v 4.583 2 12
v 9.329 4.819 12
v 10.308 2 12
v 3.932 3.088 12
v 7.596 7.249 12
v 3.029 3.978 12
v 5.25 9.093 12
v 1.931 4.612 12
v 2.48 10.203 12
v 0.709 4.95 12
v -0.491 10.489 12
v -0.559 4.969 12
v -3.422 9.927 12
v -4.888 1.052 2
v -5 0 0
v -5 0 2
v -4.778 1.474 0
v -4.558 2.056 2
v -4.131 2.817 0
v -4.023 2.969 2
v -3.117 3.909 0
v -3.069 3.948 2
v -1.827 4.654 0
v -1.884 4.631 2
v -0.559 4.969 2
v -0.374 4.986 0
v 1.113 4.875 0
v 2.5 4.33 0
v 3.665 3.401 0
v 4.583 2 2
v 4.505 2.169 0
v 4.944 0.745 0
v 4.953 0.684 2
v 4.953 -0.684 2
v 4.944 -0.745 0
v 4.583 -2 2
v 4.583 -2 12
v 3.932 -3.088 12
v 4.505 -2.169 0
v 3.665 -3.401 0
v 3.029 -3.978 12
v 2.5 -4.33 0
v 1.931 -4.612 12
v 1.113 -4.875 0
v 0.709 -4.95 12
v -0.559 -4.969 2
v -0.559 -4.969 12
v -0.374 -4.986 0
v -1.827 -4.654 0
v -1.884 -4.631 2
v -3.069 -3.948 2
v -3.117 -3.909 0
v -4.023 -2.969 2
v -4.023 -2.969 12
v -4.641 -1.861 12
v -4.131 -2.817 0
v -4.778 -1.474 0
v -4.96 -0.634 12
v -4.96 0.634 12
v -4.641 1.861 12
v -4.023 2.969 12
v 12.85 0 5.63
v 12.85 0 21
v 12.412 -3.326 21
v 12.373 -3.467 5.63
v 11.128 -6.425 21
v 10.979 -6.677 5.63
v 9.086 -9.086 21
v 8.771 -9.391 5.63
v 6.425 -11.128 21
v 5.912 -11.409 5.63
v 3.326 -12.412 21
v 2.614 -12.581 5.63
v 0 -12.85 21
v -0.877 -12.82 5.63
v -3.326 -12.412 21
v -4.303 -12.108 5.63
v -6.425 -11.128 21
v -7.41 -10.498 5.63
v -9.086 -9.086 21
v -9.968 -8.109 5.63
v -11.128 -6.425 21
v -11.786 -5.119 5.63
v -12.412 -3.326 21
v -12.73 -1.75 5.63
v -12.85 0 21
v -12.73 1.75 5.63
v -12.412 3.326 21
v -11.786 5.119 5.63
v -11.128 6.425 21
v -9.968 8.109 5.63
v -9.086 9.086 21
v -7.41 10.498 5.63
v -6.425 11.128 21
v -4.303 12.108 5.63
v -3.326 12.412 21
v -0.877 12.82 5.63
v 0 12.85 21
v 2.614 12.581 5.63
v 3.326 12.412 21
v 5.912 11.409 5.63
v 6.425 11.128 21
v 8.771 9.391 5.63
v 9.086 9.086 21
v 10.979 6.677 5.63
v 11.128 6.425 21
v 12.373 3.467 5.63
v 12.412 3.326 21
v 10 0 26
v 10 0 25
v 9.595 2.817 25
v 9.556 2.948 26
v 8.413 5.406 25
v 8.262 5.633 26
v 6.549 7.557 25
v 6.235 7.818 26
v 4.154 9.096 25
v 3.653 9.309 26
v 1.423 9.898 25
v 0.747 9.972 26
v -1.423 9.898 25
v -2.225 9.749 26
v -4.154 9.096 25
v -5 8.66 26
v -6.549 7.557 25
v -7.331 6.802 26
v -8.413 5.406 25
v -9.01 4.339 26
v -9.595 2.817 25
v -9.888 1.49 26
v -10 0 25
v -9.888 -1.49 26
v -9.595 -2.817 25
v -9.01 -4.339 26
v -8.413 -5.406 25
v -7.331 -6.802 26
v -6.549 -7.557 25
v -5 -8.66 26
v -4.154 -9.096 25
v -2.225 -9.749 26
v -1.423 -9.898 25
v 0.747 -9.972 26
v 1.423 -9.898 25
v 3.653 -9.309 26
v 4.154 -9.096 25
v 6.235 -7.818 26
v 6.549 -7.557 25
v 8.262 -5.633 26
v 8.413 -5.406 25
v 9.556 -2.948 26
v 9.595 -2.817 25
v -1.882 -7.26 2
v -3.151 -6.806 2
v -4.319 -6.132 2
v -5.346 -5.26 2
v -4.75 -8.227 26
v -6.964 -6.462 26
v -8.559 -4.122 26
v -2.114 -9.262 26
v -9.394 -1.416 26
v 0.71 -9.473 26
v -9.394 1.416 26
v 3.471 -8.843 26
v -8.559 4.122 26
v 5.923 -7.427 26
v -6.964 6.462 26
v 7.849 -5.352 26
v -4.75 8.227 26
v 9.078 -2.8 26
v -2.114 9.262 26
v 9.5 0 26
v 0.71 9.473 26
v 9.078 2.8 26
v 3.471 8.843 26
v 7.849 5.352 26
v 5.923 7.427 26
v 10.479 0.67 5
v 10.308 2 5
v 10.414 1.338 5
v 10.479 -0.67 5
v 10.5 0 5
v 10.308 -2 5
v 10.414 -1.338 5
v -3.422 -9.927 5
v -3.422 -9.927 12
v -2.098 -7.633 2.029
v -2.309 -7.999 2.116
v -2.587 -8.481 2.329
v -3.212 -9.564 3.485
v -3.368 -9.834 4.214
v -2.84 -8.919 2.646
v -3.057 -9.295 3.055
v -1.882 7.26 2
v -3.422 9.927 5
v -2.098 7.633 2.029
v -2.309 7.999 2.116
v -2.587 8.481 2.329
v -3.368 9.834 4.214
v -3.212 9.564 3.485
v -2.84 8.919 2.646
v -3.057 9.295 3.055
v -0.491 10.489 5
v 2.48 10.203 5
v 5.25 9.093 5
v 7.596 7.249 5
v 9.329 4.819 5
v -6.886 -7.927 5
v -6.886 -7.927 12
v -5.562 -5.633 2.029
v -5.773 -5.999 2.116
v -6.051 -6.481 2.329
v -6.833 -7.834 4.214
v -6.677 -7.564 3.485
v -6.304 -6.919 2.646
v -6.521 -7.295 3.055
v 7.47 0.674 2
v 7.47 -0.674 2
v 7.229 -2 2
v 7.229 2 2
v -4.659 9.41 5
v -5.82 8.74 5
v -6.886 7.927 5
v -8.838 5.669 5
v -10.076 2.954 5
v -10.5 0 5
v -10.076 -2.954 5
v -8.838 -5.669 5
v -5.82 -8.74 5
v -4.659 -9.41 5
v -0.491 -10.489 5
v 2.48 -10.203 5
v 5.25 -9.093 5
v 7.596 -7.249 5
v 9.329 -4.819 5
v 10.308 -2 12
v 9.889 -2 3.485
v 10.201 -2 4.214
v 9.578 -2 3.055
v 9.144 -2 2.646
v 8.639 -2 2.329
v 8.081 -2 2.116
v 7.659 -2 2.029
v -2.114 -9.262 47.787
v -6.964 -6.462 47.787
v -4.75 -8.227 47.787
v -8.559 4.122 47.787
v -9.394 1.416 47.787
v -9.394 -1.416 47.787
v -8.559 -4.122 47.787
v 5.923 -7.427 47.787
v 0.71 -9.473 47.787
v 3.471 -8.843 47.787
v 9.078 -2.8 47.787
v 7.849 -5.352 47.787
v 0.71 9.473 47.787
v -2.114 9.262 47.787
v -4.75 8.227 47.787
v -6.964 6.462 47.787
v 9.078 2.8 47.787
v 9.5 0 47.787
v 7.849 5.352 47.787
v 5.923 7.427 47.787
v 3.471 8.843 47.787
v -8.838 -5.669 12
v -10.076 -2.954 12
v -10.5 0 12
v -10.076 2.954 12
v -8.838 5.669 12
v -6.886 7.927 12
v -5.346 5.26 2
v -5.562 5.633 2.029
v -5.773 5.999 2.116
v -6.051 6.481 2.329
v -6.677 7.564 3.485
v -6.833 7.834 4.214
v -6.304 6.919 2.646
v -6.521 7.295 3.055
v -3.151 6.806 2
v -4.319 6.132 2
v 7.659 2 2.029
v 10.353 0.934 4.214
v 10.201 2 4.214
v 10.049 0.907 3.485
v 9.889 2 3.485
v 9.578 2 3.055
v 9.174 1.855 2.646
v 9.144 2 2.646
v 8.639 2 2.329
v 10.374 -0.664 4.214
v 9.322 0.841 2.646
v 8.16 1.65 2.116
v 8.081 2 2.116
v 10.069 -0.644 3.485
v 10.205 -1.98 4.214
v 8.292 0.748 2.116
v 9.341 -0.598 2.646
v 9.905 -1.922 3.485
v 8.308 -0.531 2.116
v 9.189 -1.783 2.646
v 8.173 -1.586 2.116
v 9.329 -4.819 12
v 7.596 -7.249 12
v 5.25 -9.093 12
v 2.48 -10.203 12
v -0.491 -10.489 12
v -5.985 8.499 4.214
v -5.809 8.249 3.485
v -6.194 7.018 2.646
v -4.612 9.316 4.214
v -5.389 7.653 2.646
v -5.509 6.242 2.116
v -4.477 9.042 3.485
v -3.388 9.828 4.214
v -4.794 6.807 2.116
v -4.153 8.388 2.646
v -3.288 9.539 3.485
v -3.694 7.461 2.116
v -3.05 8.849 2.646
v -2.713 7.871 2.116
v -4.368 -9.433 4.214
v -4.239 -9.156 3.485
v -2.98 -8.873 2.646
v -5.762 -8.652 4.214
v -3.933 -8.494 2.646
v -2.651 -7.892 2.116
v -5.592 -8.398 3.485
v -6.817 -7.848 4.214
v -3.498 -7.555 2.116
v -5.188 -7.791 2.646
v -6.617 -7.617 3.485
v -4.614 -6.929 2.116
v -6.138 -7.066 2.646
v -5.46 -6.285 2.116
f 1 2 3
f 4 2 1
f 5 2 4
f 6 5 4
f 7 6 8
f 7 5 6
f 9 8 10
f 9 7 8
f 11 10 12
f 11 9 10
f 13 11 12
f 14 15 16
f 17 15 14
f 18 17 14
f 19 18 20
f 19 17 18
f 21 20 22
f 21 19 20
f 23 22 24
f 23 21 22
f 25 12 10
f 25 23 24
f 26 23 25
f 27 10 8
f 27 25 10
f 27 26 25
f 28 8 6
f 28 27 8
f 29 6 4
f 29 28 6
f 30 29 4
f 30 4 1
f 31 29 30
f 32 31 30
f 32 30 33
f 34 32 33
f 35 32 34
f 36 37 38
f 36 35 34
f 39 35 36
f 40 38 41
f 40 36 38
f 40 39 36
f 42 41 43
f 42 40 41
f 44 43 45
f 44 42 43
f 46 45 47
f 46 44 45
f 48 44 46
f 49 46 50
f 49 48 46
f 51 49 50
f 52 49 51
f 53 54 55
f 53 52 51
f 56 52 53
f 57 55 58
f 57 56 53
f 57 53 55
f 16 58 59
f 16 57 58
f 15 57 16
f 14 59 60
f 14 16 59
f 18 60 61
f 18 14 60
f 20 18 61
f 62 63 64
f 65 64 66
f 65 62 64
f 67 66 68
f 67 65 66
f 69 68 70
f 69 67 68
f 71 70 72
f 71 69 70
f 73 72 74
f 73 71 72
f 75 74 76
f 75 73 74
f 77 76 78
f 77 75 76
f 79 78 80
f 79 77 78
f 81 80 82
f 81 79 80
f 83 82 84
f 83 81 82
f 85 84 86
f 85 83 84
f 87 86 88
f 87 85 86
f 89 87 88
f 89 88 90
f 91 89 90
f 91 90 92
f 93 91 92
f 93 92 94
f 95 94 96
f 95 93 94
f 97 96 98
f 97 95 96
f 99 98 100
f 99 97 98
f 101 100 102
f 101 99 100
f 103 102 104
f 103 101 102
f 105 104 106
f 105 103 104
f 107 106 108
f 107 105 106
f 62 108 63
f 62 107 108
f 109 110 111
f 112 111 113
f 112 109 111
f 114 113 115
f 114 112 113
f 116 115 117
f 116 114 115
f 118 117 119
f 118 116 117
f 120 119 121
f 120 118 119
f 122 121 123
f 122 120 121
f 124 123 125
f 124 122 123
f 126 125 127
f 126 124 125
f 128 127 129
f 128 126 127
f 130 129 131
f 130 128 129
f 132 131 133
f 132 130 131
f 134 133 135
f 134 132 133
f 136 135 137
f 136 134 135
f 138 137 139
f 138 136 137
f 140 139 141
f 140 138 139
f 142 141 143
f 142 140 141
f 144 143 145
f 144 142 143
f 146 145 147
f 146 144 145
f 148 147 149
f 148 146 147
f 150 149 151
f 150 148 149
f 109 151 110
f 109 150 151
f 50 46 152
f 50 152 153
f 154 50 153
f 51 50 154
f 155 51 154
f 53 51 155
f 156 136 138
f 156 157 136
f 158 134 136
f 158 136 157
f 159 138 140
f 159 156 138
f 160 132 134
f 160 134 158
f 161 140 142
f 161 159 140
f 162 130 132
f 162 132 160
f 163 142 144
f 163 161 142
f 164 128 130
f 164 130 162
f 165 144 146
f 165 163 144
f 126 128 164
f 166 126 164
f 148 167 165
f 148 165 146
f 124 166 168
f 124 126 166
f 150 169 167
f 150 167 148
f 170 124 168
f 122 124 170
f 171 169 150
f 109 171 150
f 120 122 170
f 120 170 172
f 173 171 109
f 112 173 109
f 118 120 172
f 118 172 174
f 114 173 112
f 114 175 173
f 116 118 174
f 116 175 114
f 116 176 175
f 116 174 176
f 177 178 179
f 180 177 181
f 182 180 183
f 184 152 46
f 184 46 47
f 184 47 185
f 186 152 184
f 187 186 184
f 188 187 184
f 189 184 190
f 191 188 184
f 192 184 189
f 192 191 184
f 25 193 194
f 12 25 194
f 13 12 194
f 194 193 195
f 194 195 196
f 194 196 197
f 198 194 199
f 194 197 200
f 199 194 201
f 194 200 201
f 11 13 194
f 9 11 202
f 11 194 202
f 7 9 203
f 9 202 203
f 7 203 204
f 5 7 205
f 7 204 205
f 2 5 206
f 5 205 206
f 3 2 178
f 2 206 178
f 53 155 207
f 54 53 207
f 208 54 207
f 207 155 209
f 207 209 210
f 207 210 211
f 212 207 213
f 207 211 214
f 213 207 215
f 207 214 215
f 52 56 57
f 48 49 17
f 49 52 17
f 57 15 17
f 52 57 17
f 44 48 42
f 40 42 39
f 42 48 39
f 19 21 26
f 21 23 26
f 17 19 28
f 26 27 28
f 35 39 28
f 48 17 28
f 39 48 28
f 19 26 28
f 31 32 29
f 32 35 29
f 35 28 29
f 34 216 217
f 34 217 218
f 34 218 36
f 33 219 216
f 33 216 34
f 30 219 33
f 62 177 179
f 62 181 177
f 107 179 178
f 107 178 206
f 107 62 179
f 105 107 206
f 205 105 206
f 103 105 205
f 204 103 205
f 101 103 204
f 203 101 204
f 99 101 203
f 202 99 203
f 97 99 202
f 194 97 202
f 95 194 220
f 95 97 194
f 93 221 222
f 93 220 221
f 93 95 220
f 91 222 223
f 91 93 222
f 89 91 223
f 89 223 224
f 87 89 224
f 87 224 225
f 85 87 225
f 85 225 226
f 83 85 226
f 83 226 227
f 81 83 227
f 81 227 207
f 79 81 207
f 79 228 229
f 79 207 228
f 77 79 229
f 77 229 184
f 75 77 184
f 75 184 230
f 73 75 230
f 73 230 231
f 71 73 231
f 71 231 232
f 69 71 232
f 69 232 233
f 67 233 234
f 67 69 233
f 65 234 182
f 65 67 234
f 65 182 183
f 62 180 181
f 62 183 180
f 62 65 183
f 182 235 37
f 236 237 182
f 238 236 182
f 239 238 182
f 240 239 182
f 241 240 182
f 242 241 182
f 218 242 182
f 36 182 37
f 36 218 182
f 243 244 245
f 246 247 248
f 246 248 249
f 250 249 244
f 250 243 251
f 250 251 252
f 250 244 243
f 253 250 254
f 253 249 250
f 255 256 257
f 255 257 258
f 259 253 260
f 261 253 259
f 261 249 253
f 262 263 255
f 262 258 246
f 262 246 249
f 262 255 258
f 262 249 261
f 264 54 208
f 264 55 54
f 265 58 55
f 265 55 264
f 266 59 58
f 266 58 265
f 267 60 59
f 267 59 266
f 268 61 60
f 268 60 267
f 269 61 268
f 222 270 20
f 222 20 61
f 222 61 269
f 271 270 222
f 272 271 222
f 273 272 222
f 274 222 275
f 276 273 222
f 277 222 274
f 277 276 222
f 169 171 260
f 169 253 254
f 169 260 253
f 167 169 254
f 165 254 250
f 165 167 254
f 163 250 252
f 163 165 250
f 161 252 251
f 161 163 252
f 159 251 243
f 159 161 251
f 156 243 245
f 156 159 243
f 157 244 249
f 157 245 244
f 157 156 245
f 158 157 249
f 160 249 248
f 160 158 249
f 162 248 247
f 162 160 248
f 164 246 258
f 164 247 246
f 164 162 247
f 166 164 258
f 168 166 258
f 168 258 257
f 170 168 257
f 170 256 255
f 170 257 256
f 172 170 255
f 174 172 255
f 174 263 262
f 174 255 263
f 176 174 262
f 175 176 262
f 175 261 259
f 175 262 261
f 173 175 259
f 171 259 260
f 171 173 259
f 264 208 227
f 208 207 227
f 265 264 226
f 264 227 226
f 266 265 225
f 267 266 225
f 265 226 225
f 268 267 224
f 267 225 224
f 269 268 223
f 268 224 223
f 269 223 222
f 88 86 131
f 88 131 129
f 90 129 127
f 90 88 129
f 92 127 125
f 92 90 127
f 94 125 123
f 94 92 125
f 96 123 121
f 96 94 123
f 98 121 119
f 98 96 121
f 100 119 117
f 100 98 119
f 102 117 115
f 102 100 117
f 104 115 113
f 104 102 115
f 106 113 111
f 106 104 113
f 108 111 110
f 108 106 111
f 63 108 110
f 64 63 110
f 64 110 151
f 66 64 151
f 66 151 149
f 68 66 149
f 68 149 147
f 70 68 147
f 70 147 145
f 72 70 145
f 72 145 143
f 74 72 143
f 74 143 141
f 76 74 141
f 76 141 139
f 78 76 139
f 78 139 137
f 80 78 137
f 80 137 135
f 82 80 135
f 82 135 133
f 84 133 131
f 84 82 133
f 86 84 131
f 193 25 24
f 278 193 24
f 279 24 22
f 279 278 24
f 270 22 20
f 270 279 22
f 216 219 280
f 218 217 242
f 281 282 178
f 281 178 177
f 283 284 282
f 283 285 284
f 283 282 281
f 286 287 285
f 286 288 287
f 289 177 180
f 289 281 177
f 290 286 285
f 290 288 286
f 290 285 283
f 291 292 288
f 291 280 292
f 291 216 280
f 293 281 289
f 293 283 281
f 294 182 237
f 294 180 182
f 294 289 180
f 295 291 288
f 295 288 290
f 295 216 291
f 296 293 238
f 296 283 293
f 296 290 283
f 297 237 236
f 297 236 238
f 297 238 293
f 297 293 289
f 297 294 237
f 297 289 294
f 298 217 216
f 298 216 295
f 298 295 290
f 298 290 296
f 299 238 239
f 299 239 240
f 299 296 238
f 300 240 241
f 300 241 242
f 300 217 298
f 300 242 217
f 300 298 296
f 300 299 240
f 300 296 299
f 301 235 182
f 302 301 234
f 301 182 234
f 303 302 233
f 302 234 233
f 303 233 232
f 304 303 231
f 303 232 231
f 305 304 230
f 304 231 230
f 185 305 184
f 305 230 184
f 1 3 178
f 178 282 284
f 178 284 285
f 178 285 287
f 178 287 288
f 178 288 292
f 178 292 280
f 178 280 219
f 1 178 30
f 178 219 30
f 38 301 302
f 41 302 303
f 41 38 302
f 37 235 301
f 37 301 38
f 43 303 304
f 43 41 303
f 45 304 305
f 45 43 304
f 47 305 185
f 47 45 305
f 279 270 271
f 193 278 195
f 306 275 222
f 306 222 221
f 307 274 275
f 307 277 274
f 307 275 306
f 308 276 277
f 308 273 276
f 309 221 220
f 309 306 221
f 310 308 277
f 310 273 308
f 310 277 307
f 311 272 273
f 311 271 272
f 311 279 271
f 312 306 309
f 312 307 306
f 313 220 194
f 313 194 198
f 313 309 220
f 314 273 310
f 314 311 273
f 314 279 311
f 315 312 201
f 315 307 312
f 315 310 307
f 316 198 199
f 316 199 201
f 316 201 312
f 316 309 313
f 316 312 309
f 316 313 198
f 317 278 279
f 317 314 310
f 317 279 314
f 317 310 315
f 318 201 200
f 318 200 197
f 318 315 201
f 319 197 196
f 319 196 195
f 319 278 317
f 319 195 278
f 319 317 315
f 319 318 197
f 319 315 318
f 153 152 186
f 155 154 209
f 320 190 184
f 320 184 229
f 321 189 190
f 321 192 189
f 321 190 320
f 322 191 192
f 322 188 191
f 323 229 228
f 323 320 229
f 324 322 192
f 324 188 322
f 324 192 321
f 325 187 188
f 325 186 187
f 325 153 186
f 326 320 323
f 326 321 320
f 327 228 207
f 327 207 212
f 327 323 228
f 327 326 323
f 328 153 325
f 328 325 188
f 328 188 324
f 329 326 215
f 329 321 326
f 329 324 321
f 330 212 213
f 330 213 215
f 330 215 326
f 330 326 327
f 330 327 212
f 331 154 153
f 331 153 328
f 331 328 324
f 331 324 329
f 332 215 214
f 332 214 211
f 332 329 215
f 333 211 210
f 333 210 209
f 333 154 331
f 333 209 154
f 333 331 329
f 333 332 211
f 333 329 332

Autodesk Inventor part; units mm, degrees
ref_plane "YZ Plane" through (0, 0, 0) normal (1, 0, 0) x (0, 1, 0)
ref_plane "XZ Plane" through (0, 0, 0) normal (0, 1, 0) x (-1, 0, 0)
ref_plane "XY Plane" through (0, 0, 0) normal (0, 0, 1) x (1, 0, 0)
sketch "草圖1" plane through (0, 0, 0) normal (0, 0, 1) x (1, 0, 0)
  circle A0 centre (0, 0) radius 12.85
  dimension "d0" = 25.7
extrude "擠出1" add sketch "草圖1" along normal blind 26
sketch "草圖2" plane through (0, 0, 26) normal (0, 0, 1) x (1, 0, 0)
  circle A0 centre (0, 0) radius 10
  circle A1 centre (0, 0) radius 12.85 projected
  dimension "d3" = 20
extrude "擠出2" cut sketch "草圖2" against normal blind 1
sketch "草圖3" plane through (0, 0, 0) normal (0, 1, 0) x (-1, 0, 0)
  line L0 (-12.85, 25) -> (12.85, 25) projected
  line L1 (10, 26) -> (10, 25) projected
  line L2 (10, 25) -> (12.85, 21)
  line L3 (12.85, 0) -> (12.85, 25) projected
  line L4 (0, -5.2) -> (0, 31.2) projected
  point P0 (0, 0)
  dimension "d6" = 4
revolve "迴轉1" cut sketch "草圖3" angle 360 about axis through (0, 0, -10) along (0, 0, 1)
sketch "草圖4" plane through (0, 0, 0) normal (0, 0, -1) x (-1, 0, 0)
  circle A0 centre (0, 0) radius 5
  circle A1 centre (0, 0) radius 12.85 projected
  dimension "d8" = 10
extrude "擠出3" cut sketch "草圖4" against normal blind 2
sketch "草圖5" plane through (0, 0, 2) normal (0, 0, -1) x (-1, 0, 0)
  circle A0 centre (0, 0) radius 10.5
  circle A1 centre (0, 0) radius 12.85 projected
  dimension "d11" = 21
extrude "擠出4" cut sketch "草圖5" against normal blind 3
sketch "草圖6" plane through (0, 0, 2) normal (0, 0, -1) x (-1, 0, 0)
  line L0 (0, 0) -> (-13.3502, 0) construction
  line L1 (0, 0) -> (8.2303, -14.2554) construction
  line L2 (0, 0) -> (8.5219, 14.7603) construction
  line L3 (-10.3078, -2) -> (-4.5826, -2)
  line L4 (-10.3078, 2) -> (-4.5826, 2)
  circle A0 centre (0, 0) radius 5 projected
  circle A1 centre (0, 0) radius 10.5 projected
  line L5 (0.5592, -4.9686) -> (3.4218, -9.9268)
  line L6 (4.0233, -2.9686) -> (6.8859, -7.9268)
  line L7 (4.0233, 2.9686) -> (6.8859, 7.9268)
  line L8 (0.5592, 4.9686) -> (3.4218, 9.9268)
  dimension "d14" = 120
  dimension "d15" = 120
  dimension "d16" = 2
  dimension "d17" = 2
  dimension "d18" = 4
  dimension "d19" = 2
  dimension "d20" = 2
  dimension "d21" = 2
extrude "擠出5" cut sketch "草圖6" against normal blind 10 contours L3 A0 L5 A1 | A1 L8 A0 L4 | L6 A0 L7 A1
fillet "圓角1" radius 3 3 edges at (10.5, 0, 2) (-5.25, 9.0933, 2) (-5.25, -9.0933, 2)
sketch "草圖8" plane through (0, 0, 0) normal (0, 1, 0) x (-1, 0, 0)
  line L0 (-12.85, 5) -> (-12.85, 5.6297)
  line L1 (0, -5.2) -> (0, 31.2) projected
  line L2 (-12.85, 5.6297) -> (-10.5, 5)
  line L3 (12.85, 5) -> (-12.85, 5) projected
  line L4 (-10.5, 5) -> (-10.3078, 5) projected
  point P0 (0, 0)
  dimension "d28" = 15
revolve "迴轉2" cut sketch "草圖8" angle 360 about axis through (0, 0, -10) along (0, 0, 1)
sketch "草圖9" plane through (0, 0, 26) normal (0, 0, 1) x (1, 0, 0)
  circle A0 centre (0, 0) radius 9.5
  dimension "d29" = 19
extrude "擠出6" add sketch "草圖9" along normal blind 21.787
equation "\"d15\" = d14"
equation "\"d17\" = d16"
equation "\"d20\" = d19"
equation "\"d21\" = d19"
properties part number "moter"
